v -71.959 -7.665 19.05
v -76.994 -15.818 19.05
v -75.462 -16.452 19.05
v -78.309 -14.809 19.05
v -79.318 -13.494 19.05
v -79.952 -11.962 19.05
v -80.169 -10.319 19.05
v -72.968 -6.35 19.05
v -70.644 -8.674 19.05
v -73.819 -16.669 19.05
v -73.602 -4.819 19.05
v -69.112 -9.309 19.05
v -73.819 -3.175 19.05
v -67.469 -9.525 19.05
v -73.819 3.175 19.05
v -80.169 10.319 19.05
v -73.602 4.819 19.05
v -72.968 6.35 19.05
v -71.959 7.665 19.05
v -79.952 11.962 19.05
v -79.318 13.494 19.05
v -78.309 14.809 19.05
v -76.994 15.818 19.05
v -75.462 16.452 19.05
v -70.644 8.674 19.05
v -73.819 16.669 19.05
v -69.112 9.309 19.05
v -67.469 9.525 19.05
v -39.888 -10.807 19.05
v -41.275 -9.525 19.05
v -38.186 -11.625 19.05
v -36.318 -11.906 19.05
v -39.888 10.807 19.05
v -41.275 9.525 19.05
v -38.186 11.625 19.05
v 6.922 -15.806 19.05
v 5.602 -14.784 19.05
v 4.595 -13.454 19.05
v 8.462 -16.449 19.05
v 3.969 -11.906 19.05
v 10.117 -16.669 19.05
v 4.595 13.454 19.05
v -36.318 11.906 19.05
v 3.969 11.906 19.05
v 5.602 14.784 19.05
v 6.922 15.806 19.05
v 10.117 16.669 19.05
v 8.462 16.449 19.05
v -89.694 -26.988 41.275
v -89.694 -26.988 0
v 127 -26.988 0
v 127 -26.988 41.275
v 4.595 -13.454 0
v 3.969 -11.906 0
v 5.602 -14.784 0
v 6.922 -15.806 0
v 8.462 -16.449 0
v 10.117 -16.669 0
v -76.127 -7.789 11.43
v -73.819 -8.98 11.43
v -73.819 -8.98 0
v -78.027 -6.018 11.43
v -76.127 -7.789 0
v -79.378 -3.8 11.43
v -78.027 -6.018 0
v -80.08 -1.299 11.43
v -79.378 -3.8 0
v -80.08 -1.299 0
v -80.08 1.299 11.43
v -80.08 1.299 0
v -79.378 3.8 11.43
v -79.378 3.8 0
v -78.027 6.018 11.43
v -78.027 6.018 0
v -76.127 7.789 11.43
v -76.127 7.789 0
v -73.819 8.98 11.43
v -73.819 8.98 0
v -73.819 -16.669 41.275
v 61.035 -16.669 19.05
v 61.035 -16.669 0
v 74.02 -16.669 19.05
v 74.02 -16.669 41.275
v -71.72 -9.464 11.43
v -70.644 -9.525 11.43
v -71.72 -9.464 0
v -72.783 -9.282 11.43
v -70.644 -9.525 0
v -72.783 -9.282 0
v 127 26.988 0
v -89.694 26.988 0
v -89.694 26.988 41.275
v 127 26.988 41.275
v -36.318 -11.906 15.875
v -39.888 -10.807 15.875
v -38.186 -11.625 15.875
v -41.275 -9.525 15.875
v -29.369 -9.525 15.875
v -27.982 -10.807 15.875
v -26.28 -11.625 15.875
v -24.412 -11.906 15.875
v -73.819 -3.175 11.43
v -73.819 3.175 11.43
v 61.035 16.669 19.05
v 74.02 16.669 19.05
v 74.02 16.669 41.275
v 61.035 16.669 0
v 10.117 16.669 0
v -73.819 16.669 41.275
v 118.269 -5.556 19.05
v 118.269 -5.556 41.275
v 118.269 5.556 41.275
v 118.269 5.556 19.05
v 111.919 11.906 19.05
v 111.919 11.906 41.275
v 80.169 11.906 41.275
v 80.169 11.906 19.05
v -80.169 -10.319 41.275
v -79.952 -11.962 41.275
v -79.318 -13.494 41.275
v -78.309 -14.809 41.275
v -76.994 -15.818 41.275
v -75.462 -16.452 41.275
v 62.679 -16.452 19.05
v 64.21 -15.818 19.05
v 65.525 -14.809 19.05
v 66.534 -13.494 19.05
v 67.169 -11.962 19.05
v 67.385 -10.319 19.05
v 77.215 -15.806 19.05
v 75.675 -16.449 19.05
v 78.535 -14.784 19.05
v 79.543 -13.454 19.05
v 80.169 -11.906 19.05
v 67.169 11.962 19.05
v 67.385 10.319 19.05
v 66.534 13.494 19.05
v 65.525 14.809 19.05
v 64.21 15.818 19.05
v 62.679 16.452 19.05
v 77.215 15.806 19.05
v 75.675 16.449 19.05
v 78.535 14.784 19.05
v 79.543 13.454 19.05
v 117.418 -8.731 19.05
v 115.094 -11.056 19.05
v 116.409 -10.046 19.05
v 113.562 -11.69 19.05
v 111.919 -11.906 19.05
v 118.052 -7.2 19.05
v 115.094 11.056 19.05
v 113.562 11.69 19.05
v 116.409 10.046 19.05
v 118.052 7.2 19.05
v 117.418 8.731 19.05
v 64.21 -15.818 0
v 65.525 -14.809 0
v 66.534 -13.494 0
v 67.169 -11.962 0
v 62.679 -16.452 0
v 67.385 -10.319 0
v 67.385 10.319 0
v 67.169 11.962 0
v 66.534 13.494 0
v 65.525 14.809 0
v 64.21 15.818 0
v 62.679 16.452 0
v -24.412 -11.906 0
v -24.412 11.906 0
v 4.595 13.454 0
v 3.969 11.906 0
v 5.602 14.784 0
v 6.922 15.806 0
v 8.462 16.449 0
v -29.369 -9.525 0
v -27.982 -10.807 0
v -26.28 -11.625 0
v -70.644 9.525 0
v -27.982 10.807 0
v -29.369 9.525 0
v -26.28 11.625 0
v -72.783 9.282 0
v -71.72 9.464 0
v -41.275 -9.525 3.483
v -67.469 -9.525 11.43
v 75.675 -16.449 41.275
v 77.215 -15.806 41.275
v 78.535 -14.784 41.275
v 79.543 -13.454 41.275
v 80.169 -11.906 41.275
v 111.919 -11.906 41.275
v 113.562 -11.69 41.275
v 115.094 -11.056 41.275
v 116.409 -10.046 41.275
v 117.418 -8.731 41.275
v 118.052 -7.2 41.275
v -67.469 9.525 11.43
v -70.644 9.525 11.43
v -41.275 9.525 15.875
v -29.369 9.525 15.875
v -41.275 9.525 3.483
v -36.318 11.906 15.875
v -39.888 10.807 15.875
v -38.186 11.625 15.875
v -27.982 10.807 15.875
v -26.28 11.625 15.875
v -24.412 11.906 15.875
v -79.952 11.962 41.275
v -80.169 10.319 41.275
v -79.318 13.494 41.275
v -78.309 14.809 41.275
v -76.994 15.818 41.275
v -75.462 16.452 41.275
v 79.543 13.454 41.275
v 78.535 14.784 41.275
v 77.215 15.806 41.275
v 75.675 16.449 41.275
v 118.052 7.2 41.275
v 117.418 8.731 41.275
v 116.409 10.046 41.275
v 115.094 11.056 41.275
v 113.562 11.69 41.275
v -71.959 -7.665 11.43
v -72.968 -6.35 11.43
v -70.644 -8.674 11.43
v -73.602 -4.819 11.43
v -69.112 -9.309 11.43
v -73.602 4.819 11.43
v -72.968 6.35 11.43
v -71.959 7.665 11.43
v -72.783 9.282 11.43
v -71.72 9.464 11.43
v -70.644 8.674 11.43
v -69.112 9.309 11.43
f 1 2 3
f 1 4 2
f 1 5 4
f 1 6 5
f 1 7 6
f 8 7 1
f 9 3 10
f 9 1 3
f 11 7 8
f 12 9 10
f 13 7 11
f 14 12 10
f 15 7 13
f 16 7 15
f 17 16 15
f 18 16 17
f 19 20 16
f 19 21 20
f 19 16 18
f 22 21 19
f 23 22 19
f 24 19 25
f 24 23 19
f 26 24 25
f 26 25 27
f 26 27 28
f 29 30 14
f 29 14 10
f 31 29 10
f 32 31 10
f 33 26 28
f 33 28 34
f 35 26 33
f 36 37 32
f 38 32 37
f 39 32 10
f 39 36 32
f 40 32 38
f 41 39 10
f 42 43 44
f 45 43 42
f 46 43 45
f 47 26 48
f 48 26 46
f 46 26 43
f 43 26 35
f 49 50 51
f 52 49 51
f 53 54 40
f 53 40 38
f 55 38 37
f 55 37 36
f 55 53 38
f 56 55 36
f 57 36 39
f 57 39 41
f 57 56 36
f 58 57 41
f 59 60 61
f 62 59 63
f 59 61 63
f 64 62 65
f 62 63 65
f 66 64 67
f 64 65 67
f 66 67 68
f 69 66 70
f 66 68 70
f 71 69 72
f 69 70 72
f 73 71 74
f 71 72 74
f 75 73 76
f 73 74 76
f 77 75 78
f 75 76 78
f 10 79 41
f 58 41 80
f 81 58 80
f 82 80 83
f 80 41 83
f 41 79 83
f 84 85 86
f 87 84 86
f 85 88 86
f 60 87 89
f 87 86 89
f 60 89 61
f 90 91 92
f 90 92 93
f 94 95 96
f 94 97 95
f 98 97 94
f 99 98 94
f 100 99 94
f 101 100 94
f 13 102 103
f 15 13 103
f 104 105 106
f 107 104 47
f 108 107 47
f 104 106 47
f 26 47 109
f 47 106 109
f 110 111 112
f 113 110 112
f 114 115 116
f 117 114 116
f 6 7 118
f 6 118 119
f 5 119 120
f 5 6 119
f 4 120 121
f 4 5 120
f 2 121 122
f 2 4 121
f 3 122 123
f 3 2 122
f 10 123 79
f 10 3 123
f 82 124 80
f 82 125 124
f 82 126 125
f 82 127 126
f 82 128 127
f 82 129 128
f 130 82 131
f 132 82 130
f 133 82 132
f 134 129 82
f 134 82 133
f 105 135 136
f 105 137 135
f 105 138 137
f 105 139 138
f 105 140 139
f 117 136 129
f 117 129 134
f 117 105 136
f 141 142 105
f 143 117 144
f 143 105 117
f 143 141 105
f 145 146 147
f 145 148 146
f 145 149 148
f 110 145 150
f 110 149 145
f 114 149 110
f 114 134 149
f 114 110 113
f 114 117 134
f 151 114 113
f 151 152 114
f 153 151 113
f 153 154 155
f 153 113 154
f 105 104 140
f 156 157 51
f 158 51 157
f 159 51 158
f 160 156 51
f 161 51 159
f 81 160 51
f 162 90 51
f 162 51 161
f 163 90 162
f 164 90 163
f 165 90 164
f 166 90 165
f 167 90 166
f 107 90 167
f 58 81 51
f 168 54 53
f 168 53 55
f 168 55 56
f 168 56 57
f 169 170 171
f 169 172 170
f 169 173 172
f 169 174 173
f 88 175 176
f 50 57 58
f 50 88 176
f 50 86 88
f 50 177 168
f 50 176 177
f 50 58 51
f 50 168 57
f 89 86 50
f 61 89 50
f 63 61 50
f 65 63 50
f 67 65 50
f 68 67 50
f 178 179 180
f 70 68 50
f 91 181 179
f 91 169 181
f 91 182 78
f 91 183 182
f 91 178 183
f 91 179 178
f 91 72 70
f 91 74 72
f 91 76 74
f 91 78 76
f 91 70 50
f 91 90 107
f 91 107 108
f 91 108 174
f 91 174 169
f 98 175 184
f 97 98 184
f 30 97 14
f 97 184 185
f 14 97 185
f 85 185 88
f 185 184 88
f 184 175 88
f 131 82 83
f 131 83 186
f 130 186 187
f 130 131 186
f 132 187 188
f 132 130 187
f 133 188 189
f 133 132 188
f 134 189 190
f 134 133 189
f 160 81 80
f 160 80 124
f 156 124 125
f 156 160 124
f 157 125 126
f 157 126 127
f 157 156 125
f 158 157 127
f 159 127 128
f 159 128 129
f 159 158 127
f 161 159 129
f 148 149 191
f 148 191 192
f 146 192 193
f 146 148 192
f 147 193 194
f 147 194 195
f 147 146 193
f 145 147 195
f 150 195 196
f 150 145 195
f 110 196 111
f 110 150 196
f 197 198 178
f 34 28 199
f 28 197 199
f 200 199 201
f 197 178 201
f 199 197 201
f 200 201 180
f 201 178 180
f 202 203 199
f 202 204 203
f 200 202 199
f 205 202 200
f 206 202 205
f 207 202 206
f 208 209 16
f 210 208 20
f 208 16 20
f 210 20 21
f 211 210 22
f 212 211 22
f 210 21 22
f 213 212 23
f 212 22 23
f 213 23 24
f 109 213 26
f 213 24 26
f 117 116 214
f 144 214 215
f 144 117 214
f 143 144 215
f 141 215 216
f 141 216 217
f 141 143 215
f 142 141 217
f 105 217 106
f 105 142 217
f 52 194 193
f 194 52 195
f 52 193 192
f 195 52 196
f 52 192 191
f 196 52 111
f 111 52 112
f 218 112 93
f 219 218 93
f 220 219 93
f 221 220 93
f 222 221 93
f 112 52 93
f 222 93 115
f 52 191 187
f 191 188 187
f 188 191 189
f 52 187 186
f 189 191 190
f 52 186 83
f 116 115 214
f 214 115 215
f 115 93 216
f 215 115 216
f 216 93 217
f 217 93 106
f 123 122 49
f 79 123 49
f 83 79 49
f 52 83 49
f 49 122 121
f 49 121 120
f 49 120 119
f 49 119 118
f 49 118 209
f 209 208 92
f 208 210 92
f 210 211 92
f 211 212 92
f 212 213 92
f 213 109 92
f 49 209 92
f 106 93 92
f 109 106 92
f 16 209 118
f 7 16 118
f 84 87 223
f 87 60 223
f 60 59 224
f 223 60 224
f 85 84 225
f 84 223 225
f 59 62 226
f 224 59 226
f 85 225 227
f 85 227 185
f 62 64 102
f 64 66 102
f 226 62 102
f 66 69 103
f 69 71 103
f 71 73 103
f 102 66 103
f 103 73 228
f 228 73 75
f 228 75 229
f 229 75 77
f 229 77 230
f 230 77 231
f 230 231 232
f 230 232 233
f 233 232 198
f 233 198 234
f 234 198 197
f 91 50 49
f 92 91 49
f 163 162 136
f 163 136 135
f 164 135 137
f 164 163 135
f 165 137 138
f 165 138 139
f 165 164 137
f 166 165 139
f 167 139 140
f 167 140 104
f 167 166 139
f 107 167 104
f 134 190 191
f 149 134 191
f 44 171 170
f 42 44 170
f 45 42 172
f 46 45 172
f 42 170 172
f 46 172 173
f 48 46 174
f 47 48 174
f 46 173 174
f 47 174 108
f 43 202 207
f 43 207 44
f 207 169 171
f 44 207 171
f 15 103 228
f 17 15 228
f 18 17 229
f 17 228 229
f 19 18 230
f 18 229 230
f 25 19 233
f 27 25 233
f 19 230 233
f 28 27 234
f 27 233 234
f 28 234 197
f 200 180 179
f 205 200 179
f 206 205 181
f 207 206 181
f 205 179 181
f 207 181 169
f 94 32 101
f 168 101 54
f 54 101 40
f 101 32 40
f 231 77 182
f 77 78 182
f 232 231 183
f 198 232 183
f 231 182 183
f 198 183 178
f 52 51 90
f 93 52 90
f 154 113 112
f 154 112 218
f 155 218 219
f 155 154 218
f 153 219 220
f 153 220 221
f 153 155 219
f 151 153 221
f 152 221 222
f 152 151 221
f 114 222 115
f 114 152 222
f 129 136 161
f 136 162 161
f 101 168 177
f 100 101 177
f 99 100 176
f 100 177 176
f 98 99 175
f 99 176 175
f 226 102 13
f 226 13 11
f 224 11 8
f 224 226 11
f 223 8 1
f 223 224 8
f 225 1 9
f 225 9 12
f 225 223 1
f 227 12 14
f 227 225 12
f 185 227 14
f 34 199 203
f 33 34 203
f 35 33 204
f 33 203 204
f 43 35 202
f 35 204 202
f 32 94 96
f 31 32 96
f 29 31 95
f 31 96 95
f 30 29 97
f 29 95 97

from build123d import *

# Parameters (mm, degrees)
F0_W         = 254
F0_H         = 53.975
F1_DEPTH     = 41.275
F3_DEPTH     = 22.225
F4_T1_DEPTH  = 38.1
F4_T3_DEPTH  = 37.5959026553
F6_DEPTH     = 11.43
F8_DEPTH     = 41.276
F9_T1_DEPTH  = 19.05
F9_T3_DEPTH  = 7.62
F10_W        = 37.30625
F10_H        = 41.275
F11_DEPTH    = 53.976
F12_W        = 19.05
F12_H        = 2.38125
F13_DEPTH    = 3.175
F14_T1_DEPTH = 15.5674179031


# Not quite as in the source:
# - a fillet or chamfer that OpenCascade refuses, or shapes differently, is made with other operations: its cross-section is extruded or revolved along the edge and cut away or added


with BuildPart() as f1:
    # F0 (on Top) → F1 (new body)
    with BuildSketch(Plane.XY):
        Rectangle(F0_W, F0_H)
    extrude(amount=F1_DEPTH)

    # F2 (on face) → F3 (cut)
    with BuildSketch(Plane.XY.offset(41.275)):
        Polygon((-80.16875, 16.66875), (-80.16875, -16.66875), (80.16875, -16.66875), (80.16875, -11.90625), (118.26875, -11.90625), (118.26875, 11.90625), (80.16875, 11.90625), (80.16875, 16.66875), align=None)
    extrude(amount=-F3_DEPTH, mode=Mode.SUBTRACT)

    # F4: fillet of radius 6.35 on 6 edges, made by hand

    # F4_s2 → F4_t1 (join)
    with BuildSketch(Plane.XY.offset(3.175)):
        with BuildLine():
            ThreePointArc((-80.16875, -10.31875), (-78.3088780605, -14.8088780605), (-73.81875, -16.66875))
            Line((-73.81875, -16.66875), (-80.16875, -16.66875))
            Line((-80.16875, -16.66875), (-80.16875, -10.31875))
        make_face()
        with BuildLine():
            ThreePointArc((111.91875, -11.90625), (116.4088780605, -10.0463780605), (118.26875, -5.55625))
            Line((118.26875, -5.55625), (118.26875, -11.90625))
            Line((118.26875, -11.90625), (111.91875, -11.90625))
        make_face()
        with BuildLine():
            ThreePointArc((118.26875, 5.55625), (116.4088780605, 10.0463780605), (111.91875, 11.90625))
            Line((111.91875, 11.90625), (118.26875, 11.90625))
            Line((118.26875, 11.90625), (118.26875, 5.55625))
        make_face()
        with BuildLine():
            ThreePointArc((-80.16875, 10.31875), (-78.3088780605, 14.8088780605), (-73.81875, 16.66875))
            Line((-73.81875, 16.66875), (-80.16875, 16.66875))
            Line((-80.16875, 16.66875), (-80.16875, 10.31875))
        make_face()
    extrude(amount=F4_T1_DEPTH)

    # F4_s4 → F4_t3 (join)
    with BuildSketch(Plane.XY.offset(3.6790973447)):
        with BuildLine():
            ThreePointArc((80.16875, 11.90625), (77.9089539046, 15.3388657855), (74.0203889379, 16.66875))
            Line((74.0203889379, 16.66875), (80.16875, 16.66875))
            Line((80.16875, 16.66875), (80.16875, 11.90625))
        make_face()
        with BuildLine():
            ThreePointArc((74.0203889379, -16.66875), (77.9089539046, -15.3388657855), (80.16875, -11.90625))
            Line((80.16875, -11.90625), (80.16875, -16.66875))
            Line((80.16875, -16.66875), (74.0203889379, -16.66875))
        make_face()
    extrude(amount=F4_T3_DEPTH)

    # F5 (on face) → F6 (cut)
    with BuildSketch(Plane(origin=(0, 0, 0), x_dir=(1, 0, 0), z_dir=(0, 0, -1))):
        with BuildLine():
            Line((-29.36875, 9.525), (-70.64375, 9.525))
            ThreePointArc((-70.64375, 9.525), (-80.16875, 0), (-70.64375, -9.525))
            Line((-70.64375, -9.525), (-29.36875, -9.525))
            Line((-29.36875, -9.525), (-29.36875, -11.90625))
            Line((-29.36875, -11.90625), (3.96875, -11.90625))
            Line((3.96875, -11.90625), (3.96875, -16.66875))
            Line((3.96875, -16.66875), (67.3851976236, -16.66875))
            Line((67.3851976236, -16.66875), (67.3851976236, 16.66875))
            Line((67.3851976236, 16.66875), (3.96875, 16.66875))
            Line((3.96875, 16.66875), (3.96875, 11.90625))
            Line((3.96875, 11.90625), (-29.36875, 11.90625))
            Line((-29.36875, 11.90625), (-29.36875, 9.525))
        make_face()
    extrude(amount=-F6_DEPTH, mode=Mode.SUBTRACT)

    # F7 (on face) → F8 (cut, through all)
    with BuildSketch(Plane(origin=(0, 0, 0), x_dir=(1, 0, 0), z_dir=(0, 0, -1))):
        with BuildLine():
            Line((-29.36875, 9.525), (-70.64375, 9.525))
            ThreePointArc((-70.64375, 9.525), (-72.2544463474, 9.3878262807), (-73.81875, 8.9802561211))
            Line((-73.81875, 8.9802561211), (-73.81875, -8.9802561211))
            ThreePointArc((-73.81875, -8.9802561211), (-72.2544463474, -9.3878262807), (-70.64375, -9.525))
            Line((-70.64375, -9.525), (-29.36875, -9.525))
            Line((-29.36875, -9.525), (-29.36875, -11.90625))
            Line((-29.36875, -11.90625), (3.96875, -11.90625))
            Line((3.96875, -11.90625), (3.96875, -16.66875))
            Line((3.96875, -16.66875), (67.3851976236, -16.66875))
            Line((67.3851976236, -16.66875), (67.3851976236, 16.66875))
            Line((67.3851976236, 16.66875), (3.96875, 16.66875))
            Line((3.96875, 16.66875), (3.96875, 11.90625))
            Line((3.96875, 11.90625), (-29.36875, 11.90625))
            Line((-29.36875, 11.90625), (-29.36875, 9.525))
        make_face()
    extrude(amount=-F8_DEPTH, mode=Mode.SUBTRACT)

    # F9: fillet of radius 6.35 on 8 edges, made by hand

    # F9_s2 → F9_t1 (join)
    with BuildSketch(Plane.XY):
        with BuildLine():
            ThreePointArc((3.96875, -11.90625), (6.2285460954, -15.3388657855), (10.1171110621, -16.66875))
            Line((10.1171110621, -16.66875), (3.96875, -16.66875))
            Line((3.96875, -16.66875), (3.96875, -11.90625))
        make_face()
        with BuildLine():
            ThreePointArc((-24.4117828388, -11.90625), (-27.1614134958, -11.2800626498), (-29.36875, -9.525))
            Line((-29.36875, -9.525), (-29.36875, -11.90625))
            Line((-29.36875, -11.90625), (-24.4117828388, -11.90625))
        make_face()
        with BuildLine():
            ThreePointArc((61.0351976236, -16.66875), (65.5253256842, -14.8088780605), (67.3851976236, -10.31875))
            Line((67.3851976236, -10.31875), (67.3851976236, -16.66875))
            Line((67.3851976236, -16.66875), (61.0351976236, -16.66875))
        make_face()
        with BuildLine():
            ThreePointArc((67.3851976236, 10.31875), (65.5253256842, 14.8088780605), (61.0351976236, 16.66875))
            Line((61.0351976236, 16.66875), (67.3851976236, 16.66875))
            Line((67.3851976236, 16.66875), (67.3851976236, 10.31875))
        make_face()
        with BuildLine():
            ThreePointArc((3.96875, 11.90625), (6.2285460954, 15.3388657855), (10.1171110621, 16.66875))
            Line((10.1171110621, 16.66875), (3.96875, 16.66875))
            Line((3.96875, 16.66875), (3.96875, 11.90625))
        make_face()
        with BuildLine():
            ThreePointArc((-29.36875, 9.525), (-27.1614134958, 11.2800626498), (-24.4117828388, 11.90625))
            Line((-24.4117828388, 11.90625), (-29.36875, 11.90625))
            Line((-29.36875, 11.90625), (-29.36875, 9.525))
        make_face()
    extrude(amount=F9_T1_DEPTH)

    # F9_s4 → F9_t3 (join)
    with BuildSketch(Plane.XY.offset(11.43)):
        with BuildLine():
            ThreePointArc((-73.81875, 3.175), (-71.9588780605, 7.6651280605), (-67.46875, 9.525))
            Line((-67.46875, 9.525), (-67.46875, 10.16))
            ThreePointArc((-67.46875, 10.16), (-70.64375, 10.16), (-74.0304166667, 9.5789398625))
            Line((-74.0304166667, 9.5789398625), (-74.45375, 8.9802561211))
            Line((-74.45375, 8.9802561211), (-74.45375, 3.175))
            Line((-74.45375, 3.175), (-73.81875, 3.175))
        make_face()
        with BuildLine():
            ThreePointArc((-73.81875, -3.175), (-71.9588780605, -7.6651280605), (-67.46875, -9.525))
            Line((-67.46875, -9.525), (-67.46875, -10.16))
            ThreePointArc((-67.46875, -10.16), (-70.64375, -10.16), (-74.0304166667, -9.5789398625))
            Line((-74.0304166667, -9.5789398625), (-74.45375, -8.9802561211))
            Line((-74.45375, -8.9802561211), (-74.45375, -3.175))
            Line((-74.45375, -3.175), (-73.81875, -3.175))
        make_face()
    extrude(amount=F9_T3_DEPTH)

    # F10 (on face) → F11 (cut, through all)
    with BuildSketch(Plane.XZ.offset(26.9875)):
        with Locations((-108.346875, 20.6375)):
            Rectangle(F10_W, F10_H)
    extrude(amount=-F11_DEPTH, mode=Mode.SUBTRACT)

    # F12 (on face) → F13 (cut)
    with BuildSketch(Plane.XY.offset(19.05)):
        with Locations((-31.75, 10.715625)):
            Rectangle(F12_W, F12_H)
        with Locations((-31.75, -10.715625)):
            Rectangle(F12_W, F12_H)
    extrude(amount=-F13_DEPTH, mode=Mode.SUBTRACT)

    # F14: fillet of radius 6.35 on 2 edges, made by hand

    # F14_s2 → F14_t1 (join)
    with BuildSketch(Plane.XY.offset(3.4825820969)):
        with BuildLine():
            ThreePointArc((-41.275, 9.525), (-39.0676634958, 11.2800626498), (-36.3180328388, 11.90625))
            Line((-36.3180328388, 11.90625), (-41.275, 11.90625))
            Line((-41.275, 11.90625), (-41.275, 9.525))
        make_face()
        with BuildLine():
            ThreePointArc((-36.3180328388, -11.90625), (-39.0676634958, -11.2800626498), (-41.275, -9.525))
            Line((-41.275, -9.525), (-41.275, -11.90625))
            Line((-41.275, -11.90625), (-36.3180328388, -11.90625))
        make_face()
    extrude(amount=F14_T1_DEPTH)


solid = f1.part
